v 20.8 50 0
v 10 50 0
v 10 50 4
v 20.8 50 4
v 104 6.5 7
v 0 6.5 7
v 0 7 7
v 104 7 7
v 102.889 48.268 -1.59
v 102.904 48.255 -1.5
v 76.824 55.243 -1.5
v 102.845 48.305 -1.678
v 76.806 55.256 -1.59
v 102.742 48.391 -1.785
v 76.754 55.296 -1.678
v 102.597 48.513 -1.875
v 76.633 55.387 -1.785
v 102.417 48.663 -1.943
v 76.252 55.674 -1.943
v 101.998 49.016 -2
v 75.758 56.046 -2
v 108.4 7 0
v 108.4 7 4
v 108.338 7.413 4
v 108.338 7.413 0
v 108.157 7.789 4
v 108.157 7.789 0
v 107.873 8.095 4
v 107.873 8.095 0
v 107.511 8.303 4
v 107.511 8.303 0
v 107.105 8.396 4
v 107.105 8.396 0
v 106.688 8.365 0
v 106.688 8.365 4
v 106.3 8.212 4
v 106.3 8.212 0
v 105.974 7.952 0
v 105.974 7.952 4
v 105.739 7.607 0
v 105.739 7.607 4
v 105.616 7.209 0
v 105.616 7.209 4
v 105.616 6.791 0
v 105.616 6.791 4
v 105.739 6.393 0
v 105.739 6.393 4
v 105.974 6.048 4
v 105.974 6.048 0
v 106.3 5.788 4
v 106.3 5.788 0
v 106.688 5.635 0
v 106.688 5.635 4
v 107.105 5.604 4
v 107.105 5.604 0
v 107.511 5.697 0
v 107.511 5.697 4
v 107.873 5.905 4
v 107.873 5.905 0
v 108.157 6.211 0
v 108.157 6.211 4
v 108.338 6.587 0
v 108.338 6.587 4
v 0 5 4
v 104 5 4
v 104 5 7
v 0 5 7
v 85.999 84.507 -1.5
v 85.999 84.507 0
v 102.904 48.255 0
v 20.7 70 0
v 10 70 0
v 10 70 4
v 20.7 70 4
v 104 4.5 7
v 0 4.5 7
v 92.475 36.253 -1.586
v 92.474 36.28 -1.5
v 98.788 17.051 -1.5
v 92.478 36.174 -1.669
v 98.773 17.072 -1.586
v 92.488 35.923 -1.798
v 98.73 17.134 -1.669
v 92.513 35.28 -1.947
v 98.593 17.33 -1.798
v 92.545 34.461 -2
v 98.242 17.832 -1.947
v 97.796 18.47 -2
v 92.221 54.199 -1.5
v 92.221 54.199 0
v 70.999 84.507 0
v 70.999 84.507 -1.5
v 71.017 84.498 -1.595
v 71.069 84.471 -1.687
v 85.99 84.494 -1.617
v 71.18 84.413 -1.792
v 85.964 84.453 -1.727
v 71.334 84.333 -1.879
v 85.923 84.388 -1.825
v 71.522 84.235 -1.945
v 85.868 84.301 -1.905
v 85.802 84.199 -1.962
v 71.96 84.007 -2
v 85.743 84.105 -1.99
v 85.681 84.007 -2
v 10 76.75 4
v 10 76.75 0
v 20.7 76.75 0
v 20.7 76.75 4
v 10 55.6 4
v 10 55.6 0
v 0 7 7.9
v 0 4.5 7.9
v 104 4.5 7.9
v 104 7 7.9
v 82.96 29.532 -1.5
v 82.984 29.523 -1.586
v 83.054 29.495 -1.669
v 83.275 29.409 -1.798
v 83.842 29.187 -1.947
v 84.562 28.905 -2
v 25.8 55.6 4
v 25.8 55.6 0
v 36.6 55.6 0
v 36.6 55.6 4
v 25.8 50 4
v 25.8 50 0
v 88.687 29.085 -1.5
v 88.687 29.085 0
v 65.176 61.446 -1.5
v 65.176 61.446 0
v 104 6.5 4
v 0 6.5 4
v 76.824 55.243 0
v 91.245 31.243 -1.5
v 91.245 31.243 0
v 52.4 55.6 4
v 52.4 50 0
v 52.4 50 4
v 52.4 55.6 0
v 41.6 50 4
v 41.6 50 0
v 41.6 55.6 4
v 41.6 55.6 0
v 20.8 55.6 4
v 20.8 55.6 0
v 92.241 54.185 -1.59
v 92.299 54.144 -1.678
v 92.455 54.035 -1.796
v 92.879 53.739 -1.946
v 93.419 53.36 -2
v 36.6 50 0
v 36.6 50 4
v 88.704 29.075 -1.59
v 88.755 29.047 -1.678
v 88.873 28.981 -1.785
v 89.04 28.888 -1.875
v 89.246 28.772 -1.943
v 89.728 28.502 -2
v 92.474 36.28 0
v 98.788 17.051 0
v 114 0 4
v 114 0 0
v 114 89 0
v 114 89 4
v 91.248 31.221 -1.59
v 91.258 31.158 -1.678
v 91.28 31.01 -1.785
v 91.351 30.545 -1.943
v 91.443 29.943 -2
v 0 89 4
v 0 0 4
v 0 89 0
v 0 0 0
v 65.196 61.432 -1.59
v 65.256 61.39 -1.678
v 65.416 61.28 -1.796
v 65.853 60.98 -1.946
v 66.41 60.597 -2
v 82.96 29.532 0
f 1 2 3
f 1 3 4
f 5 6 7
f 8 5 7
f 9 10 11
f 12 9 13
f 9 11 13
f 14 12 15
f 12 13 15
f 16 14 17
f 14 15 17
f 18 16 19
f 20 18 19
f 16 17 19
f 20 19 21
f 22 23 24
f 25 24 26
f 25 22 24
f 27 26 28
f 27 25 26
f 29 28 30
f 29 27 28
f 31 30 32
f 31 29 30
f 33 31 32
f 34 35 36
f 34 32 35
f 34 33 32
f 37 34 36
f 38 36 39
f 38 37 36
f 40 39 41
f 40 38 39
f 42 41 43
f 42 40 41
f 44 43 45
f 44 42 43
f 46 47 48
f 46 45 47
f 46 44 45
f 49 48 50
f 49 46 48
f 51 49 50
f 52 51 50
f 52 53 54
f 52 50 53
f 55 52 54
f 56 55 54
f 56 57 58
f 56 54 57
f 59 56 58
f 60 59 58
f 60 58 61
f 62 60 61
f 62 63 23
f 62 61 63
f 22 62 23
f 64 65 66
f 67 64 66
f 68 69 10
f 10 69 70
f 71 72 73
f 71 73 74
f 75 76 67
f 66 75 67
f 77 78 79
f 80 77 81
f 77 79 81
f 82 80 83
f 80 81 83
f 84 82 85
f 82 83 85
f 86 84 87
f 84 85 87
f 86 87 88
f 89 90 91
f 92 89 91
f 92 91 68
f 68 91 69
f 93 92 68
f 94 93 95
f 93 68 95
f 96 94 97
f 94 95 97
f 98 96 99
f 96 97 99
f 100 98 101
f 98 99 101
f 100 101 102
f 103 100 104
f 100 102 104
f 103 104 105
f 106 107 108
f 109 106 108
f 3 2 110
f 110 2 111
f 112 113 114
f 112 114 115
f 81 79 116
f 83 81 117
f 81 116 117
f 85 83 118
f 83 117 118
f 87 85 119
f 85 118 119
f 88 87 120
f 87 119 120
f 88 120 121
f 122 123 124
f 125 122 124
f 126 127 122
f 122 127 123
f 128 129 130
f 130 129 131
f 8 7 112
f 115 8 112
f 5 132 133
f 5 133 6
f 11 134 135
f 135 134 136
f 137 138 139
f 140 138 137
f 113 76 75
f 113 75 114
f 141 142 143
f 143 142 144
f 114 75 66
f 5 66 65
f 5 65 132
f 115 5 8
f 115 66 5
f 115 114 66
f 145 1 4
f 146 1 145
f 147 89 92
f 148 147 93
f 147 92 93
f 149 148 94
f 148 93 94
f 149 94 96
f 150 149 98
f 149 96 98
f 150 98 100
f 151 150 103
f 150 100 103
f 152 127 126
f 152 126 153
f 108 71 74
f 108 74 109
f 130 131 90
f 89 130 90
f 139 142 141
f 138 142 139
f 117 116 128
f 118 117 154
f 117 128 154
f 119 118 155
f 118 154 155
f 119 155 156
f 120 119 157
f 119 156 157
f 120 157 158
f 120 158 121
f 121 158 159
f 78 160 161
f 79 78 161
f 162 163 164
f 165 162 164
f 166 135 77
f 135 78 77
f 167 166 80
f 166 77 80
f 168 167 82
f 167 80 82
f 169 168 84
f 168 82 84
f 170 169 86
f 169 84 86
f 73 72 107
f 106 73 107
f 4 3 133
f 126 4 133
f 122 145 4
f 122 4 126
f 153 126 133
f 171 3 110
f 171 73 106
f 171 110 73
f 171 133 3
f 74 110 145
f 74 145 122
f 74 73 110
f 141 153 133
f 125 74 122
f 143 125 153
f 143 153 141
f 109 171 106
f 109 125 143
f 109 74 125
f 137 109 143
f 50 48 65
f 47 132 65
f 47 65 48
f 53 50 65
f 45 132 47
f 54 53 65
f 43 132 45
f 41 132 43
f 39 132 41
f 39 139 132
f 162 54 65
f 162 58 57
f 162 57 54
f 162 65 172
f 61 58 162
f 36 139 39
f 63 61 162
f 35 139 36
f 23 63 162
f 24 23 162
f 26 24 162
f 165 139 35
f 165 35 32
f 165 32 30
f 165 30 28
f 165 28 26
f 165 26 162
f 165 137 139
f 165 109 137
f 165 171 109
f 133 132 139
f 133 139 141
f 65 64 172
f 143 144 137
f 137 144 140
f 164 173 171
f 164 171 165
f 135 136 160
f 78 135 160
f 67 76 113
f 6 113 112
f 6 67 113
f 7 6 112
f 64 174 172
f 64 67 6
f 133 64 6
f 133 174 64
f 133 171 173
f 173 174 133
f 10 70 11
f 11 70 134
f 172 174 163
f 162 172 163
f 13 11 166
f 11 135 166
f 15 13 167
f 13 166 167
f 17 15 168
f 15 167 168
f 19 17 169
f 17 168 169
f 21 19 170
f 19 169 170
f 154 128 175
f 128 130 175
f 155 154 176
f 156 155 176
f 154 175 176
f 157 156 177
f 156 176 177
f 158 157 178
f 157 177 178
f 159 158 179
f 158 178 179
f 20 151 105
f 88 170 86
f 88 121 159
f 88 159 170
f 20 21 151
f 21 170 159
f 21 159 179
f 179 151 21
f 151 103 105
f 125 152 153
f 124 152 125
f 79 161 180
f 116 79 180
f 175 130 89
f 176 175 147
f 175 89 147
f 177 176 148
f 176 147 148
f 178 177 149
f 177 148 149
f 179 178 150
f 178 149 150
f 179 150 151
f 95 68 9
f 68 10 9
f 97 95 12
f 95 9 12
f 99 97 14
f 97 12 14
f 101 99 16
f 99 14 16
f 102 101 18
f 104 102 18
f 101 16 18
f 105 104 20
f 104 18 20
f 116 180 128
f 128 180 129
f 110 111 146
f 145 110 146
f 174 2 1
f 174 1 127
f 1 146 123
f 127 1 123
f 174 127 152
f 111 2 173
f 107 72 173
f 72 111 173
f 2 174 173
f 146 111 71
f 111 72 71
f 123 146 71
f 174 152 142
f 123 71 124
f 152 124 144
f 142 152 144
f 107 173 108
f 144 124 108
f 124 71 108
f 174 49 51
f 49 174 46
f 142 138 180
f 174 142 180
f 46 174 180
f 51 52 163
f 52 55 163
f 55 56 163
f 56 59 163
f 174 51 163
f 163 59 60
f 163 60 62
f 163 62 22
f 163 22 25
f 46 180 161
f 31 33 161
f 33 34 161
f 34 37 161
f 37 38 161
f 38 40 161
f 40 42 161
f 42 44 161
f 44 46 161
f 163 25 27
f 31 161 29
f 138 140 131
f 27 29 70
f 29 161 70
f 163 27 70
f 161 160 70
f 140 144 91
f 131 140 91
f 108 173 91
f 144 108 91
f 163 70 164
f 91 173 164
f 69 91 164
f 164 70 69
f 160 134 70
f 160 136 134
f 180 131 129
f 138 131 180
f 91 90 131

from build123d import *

# Parameters (mm, degrees)
SKETCH158_W   = 114
SKETCH158_H   = 89
SKETCH158_W_2 = 10.8
SKETCH158_H_2 = 5.6
SKETCH158_W_3 = 10.7
SKETCH158_H_3 = 6.75
PAD_DEPTH     = 4
PAD001_DEPTH  = 2
FILLET_R      = 0.5
SKETCH160_W   = 1.5
SKETCH160_H   = 3
SKETCH160_W_2 = 2.5
SKETCH160_H_2 = 0.9
PAD003_DEPTH  = 104
SKETCH161_R   = 1.4
POCKET_DEPTH  = 5


with BuildPart() as part:
    # Sketch158 → Pad (new body)
    with BuildSketch(Plane.XY):
        with Locations((57, 44.5)):
            Rectangle(SKETCH158_W, SKETCH158_H)
        with Locations((31.2, 52.8)):
            Rectangle(SKETCH158_W_2, SKETCH158_H_2, mode=Mode.SUBTRACT)
        with Locations((47, 52.8)):
            Rectangle(SKETCH158_W_2, SKETCH158_H_2, mode=Mode.SUBTRACT)
        with Locations((15.4, 52.8)):
            Rectangle(SKETCH158_W_2, SKETCH158_H_2, mode=Mode.SUBTRACT)
        with Locations((15.35, 73.375)):
            Rectangle(SKETCH158_W_3, SKETCH158_H_3, mode=Mode.SUBTRACT)
    extrude(amount=PAD_DEPTH)

    # Sketch159 → Pad001 (join)
    with BuildSketch(Plane(origin=(0, 0, 0), x_dir=(1, 0, 0), z_dir=(0, 0, -1))):
        Polygon((70.999116, -84.5074), (85.999116, -84.5074), (102.903847, -48.255089), (76.823852, -55.24321), (91.244924, -31.24253), (92.473681, -36.280333), (98.788067, -17.050922), (82.960377, -29.532091), (88.686929, -29.085032), (65.175526, -61.445717), (92.221447, -54.198777), align=None)
    extrude(amount=PAD001_DEPTH)

    # Fillet
    fillet_edges = [part.edges().sort_by_distance(p)[0] for p in [
        (94.451481, 66.381245, -2),
        (78.499116, 84.5074, -2),
        (81.610281, 69.353088, -2),
        (78.698487, 57.822247, -2),
        (89.86385, 51.74915, -2),
        (84.034388, 43.24287, -2),
        (91.859302, 33.761432, -2),
        (95.630874, 26.665627, -2),
        (90.874222, 23.291507, -2),
        (85.823653, 29.308561, -2),
        (76.931228, 45.265374, -2),
    ]]
    fillet(fillet_edges, radius=FILLET_R)

    # Sketch160 → Pad003 (join)
    with BuildSketch(Plane.YZ):
        with Locations((5.75, 5.5)):
            Rectangle(SKETCH160_W, SKETCH160_H)
        with Locations((5.75, 7.45)):
            Rectangle(SKETCH160_W_2, SKETCH160_H_2)
    extrude(amount=PAD003_DEPTH)

    # Sketch161 → Pocket (cut)
    with BuildSketch(Plane.XY):
        with Locations((107, 7)):
            Circle(SKETCH161_R)
    extrude(amount=POCKET_DEPTH, mode=Mode.SUBTRACT)


solid = part.part
